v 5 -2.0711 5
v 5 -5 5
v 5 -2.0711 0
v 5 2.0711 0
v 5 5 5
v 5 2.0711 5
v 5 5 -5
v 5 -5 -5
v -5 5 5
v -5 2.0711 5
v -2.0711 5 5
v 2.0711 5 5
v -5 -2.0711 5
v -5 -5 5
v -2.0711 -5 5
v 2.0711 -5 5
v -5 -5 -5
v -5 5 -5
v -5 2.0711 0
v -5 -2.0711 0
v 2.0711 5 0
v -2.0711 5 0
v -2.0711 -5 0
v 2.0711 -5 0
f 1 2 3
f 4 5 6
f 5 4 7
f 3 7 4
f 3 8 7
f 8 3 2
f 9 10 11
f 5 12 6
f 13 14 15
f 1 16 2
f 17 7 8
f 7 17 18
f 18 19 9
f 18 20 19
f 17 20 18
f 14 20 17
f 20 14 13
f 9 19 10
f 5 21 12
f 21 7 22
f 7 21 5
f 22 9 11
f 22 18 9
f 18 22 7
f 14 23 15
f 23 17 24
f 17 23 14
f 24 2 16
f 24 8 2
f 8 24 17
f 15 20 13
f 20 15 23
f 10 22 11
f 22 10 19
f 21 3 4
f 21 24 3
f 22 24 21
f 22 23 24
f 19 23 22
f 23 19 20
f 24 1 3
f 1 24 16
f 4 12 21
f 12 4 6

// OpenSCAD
// all numbers in mm

/* really! */

module table () {
	difference() {
		cube([10,10,10],true);
		rotate([0,0,45]) translate([0,0,5]) cube([10,10,10],true);
	}
}

table();
